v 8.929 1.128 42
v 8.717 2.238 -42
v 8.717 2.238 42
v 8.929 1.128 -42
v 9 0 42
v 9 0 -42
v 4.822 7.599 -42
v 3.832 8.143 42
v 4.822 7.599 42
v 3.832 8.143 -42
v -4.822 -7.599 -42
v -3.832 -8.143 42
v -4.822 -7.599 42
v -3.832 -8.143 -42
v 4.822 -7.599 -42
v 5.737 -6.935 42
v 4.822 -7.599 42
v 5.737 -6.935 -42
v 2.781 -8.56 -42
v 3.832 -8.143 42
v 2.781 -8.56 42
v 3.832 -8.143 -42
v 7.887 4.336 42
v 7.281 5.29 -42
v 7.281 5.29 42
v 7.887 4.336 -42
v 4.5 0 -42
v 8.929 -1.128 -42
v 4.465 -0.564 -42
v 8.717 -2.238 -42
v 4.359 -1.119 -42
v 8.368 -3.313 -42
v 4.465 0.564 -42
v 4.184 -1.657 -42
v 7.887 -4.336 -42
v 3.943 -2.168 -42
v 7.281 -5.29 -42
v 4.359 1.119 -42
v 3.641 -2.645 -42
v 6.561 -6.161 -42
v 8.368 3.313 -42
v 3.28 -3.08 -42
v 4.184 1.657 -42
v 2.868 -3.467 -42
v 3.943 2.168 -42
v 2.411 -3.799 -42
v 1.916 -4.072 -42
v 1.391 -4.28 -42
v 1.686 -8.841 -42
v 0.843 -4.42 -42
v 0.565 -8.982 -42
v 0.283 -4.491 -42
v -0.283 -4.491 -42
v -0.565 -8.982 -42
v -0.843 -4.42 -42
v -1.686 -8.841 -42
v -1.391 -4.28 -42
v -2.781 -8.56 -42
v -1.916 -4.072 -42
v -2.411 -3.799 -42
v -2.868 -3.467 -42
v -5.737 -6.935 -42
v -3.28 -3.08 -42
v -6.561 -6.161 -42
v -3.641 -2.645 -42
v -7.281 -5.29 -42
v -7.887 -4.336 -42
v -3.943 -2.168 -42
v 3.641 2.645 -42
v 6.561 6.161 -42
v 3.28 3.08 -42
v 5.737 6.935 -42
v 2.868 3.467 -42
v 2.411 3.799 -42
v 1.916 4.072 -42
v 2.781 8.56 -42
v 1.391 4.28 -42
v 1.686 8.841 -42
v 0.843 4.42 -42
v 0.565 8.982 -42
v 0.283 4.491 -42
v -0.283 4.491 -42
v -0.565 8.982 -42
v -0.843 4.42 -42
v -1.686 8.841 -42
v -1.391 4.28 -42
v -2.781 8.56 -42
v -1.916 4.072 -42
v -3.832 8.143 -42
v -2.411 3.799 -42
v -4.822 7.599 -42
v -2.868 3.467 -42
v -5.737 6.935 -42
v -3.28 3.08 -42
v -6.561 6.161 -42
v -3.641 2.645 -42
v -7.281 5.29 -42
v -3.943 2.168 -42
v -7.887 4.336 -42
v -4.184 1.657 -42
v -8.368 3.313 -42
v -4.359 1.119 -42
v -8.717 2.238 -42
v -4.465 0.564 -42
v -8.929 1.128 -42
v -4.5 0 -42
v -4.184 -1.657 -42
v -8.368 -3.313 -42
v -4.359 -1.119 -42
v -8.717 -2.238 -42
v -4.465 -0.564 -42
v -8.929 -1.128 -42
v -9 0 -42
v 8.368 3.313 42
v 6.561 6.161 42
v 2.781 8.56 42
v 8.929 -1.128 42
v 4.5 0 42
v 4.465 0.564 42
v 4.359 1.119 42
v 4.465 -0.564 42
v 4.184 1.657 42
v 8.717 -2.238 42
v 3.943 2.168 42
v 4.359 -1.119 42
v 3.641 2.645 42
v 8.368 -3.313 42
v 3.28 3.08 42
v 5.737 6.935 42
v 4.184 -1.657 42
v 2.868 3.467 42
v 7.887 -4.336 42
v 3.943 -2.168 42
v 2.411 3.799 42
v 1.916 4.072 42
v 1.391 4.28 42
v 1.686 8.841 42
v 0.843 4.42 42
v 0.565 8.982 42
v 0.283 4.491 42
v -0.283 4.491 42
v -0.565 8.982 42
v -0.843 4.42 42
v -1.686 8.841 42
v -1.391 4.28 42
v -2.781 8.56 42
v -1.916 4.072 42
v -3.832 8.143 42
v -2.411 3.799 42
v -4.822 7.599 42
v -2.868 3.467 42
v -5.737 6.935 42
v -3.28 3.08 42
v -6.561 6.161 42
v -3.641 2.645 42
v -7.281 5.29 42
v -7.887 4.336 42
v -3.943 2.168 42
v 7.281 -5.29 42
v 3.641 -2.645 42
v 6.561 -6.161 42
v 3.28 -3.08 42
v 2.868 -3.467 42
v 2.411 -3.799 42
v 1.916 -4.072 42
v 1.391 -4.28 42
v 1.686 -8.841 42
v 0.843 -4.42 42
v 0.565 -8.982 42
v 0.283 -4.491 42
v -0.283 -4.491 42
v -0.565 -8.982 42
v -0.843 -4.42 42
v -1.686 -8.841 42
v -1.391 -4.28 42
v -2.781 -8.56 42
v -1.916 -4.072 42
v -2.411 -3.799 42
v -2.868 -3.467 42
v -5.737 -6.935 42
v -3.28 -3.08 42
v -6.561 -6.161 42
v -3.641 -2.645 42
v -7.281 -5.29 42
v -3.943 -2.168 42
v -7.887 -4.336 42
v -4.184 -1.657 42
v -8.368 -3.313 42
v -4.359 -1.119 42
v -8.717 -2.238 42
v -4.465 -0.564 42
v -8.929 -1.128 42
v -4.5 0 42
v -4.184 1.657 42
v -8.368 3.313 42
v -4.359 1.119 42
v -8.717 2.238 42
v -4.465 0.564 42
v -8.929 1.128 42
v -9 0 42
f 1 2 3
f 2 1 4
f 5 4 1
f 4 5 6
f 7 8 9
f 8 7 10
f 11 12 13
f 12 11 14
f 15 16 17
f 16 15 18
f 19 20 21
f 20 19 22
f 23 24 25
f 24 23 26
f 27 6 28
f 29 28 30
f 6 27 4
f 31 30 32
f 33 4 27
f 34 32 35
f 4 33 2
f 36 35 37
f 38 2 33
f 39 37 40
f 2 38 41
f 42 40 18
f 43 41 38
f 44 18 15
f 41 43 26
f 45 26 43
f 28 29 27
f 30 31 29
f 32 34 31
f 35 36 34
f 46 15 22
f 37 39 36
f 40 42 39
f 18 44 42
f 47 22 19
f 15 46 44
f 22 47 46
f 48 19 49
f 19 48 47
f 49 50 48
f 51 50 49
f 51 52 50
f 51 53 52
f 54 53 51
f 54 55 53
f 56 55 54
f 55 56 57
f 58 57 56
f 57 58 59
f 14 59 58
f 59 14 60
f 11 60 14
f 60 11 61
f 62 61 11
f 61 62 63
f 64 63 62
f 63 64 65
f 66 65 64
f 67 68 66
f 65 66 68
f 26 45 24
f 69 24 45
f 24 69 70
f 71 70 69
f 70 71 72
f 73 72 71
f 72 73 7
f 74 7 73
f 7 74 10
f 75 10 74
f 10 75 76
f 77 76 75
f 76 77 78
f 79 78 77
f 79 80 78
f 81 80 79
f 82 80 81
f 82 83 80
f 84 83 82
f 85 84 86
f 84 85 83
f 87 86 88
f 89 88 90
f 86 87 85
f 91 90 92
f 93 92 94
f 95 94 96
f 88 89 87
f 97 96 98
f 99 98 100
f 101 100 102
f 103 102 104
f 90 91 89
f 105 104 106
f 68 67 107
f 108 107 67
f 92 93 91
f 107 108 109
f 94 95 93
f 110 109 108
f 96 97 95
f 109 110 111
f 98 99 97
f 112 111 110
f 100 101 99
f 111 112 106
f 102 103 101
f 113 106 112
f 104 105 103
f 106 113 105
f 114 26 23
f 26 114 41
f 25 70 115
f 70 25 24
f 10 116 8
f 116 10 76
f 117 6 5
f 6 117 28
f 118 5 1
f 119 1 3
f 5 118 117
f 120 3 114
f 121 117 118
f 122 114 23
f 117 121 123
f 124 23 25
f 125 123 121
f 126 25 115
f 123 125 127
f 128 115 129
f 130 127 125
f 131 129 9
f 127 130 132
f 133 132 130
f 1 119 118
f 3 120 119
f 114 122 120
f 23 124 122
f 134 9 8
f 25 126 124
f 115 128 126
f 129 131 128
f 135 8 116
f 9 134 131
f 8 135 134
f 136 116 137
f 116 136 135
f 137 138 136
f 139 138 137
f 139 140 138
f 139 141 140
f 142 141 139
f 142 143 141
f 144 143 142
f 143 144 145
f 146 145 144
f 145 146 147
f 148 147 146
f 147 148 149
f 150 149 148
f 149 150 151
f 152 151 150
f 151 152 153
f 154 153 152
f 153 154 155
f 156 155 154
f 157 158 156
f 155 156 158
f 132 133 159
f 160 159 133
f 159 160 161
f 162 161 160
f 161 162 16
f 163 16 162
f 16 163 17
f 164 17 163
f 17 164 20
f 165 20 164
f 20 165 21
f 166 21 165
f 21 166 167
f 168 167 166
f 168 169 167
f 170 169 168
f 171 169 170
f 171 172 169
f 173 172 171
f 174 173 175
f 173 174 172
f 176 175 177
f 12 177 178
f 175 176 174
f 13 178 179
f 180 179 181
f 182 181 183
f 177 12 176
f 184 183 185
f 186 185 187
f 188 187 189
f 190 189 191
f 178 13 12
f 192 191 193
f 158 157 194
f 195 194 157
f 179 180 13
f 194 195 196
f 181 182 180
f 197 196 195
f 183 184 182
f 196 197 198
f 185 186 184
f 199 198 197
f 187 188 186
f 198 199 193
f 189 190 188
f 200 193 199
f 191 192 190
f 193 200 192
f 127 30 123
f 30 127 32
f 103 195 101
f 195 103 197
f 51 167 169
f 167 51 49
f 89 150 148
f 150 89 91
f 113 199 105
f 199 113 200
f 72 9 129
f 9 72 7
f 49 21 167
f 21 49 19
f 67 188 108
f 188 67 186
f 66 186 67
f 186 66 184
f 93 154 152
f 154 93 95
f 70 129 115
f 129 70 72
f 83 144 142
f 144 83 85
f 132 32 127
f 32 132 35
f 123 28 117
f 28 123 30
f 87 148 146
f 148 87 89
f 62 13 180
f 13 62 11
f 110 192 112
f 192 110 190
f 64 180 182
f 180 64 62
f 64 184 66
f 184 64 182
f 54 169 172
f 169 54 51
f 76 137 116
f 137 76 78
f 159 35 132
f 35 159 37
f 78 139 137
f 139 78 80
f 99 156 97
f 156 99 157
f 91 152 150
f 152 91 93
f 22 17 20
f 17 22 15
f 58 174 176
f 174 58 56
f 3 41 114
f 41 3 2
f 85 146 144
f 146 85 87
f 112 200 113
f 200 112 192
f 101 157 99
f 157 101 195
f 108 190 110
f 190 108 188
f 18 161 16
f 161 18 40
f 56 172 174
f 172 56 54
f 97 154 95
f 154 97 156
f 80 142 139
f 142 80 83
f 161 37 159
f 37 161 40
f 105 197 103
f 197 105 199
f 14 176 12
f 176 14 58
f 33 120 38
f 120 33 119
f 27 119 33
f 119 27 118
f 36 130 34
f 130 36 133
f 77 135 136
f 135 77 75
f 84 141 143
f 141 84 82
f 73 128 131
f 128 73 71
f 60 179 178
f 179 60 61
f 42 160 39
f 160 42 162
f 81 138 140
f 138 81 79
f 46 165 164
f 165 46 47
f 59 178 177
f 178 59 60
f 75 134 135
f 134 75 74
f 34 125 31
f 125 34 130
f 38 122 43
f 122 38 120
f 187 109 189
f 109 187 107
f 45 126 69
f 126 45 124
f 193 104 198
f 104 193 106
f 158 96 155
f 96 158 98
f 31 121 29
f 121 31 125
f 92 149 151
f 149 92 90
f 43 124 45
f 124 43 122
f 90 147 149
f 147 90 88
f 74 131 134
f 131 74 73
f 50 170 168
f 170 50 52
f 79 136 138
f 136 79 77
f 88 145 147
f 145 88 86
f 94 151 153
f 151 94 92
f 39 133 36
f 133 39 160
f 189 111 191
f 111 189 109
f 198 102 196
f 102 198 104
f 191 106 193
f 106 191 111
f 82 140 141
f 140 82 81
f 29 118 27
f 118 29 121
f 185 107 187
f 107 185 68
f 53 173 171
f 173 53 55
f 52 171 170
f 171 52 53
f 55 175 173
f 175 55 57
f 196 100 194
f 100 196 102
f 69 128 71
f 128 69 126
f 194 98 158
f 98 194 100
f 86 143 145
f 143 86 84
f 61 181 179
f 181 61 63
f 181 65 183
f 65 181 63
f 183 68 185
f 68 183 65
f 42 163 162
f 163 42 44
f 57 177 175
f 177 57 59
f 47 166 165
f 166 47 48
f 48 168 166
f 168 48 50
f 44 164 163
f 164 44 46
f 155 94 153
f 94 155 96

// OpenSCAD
$fn = 50;


difference() {
	union() {
		translate(v = [0, 0, -42.0000000000]) {
			cylinder(h = 84, r = 9.0000000000);
		}
	}
	union() {
		translate(v = [0, 0, -100.0000000000]) {
			cylinder(h = 200, r = 4.5000000000);
		}
	}
}
